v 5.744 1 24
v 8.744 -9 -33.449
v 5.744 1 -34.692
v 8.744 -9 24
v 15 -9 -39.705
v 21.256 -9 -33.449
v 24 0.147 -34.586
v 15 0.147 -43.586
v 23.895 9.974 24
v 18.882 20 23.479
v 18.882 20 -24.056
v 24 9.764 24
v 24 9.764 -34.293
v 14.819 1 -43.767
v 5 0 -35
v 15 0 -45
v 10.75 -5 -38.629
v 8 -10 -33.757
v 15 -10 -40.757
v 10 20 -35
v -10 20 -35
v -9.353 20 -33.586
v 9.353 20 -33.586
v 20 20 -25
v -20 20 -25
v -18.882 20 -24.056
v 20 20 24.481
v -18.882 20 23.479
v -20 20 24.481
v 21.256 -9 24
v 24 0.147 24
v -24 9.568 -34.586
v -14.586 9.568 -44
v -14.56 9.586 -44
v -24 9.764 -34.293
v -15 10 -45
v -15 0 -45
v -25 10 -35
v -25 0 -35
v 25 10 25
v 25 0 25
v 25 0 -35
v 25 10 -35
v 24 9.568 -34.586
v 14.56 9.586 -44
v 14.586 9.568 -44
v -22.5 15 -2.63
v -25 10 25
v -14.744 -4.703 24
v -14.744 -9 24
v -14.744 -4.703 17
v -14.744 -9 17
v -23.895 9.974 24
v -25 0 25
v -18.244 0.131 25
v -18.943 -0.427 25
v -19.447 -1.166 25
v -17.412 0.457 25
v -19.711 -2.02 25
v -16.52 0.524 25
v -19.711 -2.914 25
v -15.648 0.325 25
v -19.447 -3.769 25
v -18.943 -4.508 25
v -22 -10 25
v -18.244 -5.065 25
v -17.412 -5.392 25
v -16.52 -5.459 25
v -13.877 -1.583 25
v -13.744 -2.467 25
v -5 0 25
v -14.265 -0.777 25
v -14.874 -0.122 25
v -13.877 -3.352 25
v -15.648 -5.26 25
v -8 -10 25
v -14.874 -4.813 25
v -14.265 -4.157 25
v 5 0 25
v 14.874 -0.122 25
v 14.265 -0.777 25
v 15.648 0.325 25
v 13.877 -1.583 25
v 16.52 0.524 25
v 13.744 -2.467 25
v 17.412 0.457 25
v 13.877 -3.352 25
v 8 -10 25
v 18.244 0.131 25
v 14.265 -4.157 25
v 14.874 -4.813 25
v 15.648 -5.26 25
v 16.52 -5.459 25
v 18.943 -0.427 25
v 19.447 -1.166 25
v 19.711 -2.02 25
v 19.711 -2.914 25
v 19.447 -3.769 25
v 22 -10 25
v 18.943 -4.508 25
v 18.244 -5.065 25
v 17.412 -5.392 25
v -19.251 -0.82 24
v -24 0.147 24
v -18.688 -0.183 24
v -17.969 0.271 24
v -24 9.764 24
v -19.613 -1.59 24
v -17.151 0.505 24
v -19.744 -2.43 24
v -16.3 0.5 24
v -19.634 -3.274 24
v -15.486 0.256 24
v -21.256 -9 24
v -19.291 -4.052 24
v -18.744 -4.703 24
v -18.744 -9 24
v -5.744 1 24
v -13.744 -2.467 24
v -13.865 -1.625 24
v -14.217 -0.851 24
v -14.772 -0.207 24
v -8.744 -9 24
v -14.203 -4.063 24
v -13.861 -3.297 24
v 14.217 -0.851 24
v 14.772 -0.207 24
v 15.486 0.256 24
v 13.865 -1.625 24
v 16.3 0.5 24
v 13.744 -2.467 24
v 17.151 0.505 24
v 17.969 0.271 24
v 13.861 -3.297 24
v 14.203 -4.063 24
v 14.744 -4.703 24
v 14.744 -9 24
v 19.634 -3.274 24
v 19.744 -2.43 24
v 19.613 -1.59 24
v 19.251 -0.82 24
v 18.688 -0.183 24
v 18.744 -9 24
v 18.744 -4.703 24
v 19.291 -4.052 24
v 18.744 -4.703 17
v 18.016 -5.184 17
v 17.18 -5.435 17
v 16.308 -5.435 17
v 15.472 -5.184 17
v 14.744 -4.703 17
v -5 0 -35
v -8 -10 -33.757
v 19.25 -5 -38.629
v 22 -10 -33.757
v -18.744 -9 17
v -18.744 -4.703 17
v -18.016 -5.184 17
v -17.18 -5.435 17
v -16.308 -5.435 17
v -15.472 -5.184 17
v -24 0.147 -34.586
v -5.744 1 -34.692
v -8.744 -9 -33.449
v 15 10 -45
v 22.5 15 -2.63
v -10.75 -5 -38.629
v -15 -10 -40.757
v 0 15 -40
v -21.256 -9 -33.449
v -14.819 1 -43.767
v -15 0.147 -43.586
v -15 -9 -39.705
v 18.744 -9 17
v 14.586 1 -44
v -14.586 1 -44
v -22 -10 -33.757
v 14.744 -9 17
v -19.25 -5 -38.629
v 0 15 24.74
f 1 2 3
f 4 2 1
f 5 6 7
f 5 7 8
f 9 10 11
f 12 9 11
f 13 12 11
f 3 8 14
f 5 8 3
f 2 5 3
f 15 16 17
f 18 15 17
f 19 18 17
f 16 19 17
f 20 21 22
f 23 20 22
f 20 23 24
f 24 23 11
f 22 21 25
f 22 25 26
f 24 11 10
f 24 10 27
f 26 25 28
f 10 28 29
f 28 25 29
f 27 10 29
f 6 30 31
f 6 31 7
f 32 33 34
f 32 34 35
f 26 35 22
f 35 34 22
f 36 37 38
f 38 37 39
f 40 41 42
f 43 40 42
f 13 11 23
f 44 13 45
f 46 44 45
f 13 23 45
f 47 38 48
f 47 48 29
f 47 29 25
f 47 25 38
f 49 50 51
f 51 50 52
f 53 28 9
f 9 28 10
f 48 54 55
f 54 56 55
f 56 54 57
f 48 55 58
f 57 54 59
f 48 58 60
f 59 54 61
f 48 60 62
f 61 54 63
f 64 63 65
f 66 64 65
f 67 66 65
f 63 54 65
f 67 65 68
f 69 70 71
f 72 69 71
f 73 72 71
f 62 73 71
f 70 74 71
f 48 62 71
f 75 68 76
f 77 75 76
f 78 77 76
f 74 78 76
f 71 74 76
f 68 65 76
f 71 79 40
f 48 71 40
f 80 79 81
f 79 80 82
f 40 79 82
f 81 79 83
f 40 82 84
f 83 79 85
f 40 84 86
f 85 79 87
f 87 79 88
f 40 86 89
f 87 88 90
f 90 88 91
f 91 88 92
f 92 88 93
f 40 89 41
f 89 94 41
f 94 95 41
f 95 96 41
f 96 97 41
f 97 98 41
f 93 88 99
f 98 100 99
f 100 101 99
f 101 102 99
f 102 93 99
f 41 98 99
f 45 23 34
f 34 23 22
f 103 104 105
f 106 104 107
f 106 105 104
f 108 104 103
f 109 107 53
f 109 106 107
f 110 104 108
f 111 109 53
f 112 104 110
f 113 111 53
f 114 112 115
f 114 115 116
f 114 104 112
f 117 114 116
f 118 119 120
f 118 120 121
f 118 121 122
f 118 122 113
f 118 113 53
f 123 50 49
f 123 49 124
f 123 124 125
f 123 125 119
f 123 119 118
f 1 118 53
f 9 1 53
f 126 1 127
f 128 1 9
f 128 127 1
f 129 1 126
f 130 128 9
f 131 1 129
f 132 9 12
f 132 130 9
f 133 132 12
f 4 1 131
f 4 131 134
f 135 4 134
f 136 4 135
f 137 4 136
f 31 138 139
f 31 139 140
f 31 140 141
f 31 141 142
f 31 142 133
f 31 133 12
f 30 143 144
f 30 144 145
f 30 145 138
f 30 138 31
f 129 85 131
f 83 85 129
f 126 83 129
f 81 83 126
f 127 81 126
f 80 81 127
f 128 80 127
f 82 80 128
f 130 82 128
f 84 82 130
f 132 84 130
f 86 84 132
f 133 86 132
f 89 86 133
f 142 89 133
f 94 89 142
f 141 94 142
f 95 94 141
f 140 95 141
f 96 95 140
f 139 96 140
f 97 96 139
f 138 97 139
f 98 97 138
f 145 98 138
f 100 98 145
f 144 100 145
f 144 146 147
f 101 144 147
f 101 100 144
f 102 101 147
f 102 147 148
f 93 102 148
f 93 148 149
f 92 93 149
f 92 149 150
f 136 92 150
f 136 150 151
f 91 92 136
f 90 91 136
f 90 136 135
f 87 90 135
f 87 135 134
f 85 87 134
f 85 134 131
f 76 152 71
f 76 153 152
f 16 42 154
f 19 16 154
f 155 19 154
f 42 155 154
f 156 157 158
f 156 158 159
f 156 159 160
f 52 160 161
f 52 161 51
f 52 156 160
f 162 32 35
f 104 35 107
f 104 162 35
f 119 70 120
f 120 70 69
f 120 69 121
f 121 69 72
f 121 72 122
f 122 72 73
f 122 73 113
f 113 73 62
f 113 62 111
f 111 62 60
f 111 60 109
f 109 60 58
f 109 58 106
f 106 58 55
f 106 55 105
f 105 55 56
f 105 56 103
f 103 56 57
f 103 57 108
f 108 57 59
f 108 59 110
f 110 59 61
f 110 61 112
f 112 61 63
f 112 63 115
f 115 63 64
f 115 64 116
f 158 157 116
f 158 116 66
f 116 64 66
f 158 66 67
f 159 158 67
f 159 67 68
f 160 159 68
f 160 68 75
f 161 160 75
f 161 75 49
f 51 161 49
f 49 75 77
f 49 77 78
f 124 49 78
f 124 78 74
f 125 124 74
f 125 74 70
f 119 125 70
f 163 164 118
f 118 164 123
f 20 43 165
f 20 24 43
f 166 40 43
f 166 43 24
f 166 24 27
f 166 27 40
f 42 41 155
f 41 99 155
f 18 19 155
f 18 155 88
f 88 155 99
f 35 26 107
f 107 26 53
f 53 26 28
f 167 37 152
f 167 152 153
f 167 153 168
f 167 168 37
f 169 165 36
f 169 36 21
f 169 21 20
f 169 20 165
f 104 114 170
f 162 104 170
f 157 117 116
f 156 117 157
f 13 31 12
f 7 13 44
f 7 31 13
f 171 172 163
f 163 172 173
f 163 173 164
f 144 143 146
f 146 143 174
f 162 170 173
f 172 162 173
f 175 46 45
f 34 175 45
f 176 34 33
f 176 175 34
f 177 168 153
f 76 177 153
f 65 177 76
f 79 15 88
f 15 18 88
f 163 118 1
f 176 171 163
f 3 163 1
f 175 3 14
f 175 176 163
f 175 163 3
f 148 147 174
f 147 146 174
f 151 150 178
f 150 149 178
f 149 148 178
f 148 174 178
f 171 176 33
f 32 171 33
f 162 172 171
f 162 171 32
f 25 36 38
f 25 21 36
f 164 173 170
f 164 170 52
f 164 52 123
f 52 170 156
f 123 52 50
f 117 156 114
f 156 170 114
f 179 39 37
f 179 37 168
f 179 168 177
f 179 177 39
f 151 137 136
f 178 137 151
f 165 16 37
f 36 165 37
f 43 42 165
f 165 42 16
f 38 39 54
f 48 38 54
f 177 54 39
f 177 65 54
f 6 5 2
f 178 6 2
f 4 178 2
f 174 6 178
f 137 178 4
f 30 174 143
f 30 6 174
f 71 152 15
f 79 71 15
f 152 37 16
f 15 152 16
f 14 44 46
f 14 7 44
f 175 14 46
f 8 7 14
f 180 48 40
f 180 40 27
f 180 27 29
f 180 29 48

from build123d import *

# Parameters (mm, degrees)
EXTRUDE_1_DEPTH     = 10
SHELL_2_T           = -1
SKETCH_8_W          = 4
SKETCH_8_H          = 7
EXTRUDE_3_DEPTH     = 5
SKETCH_9_R          = 3
CUT_EXTRUDE_1_DEPTH = 10


with BuildPart() as part:
    # 草图3 → 凸台-拉伸1 (new body)
    with BuildSketch(Plane(origin=(0, 0, 0), x_dir=(1, 0, 0), z_dir=(0, 1, 0))):
        Polygon((-25, 35), (-25, -25), (25, -25), (25, 35), (15, 45), (-15, 45), align=None)
    extrude(amount=EXTRUDE_1_DEPTH)


with BuildPart() as body_2:
    # 草图5 → 放样1 section 0
    with BuildSketch(Plane(origin=(0, 0, 0), x_dir=(1, 0, 0), z_dir=(0, 1, 0))):
        with BuildLine():
            Line((25, 35), (15, 45))
            Line((15, 45), (5, 35))
            Line((5, 35), (5, -25))
            Line((5, -25), (25, -25))
            Line((25, -25), (25, 35))
        make_face()
    # 草图6 → 放样1 section 1
    with BuildSketch(Plane(origin=(0, -10, 0), x_dir=(1, 0, 0), z_dir=(0, 1, 0))):
        with BuildLine():
            Line((22, -25), (8, -25))
            Line((8, -25), (8, 33.757359313))
            Line((8, 33.757359313), (15, 40.757359313))
            Line((15, 40.757359313), (22, 33.757359313))
            Line((22, 33.757359313), (22, -25))
        make_face()
    loft()


with BuildPart() as body_3:
    # 镜向2: mirrored copy
    add(body_2.part.mirror(Plane(origin=(0, 0, 0), x_dir=(0, 0, 1), z_dir=(1, 0, 0))))


with BuildPart() as part_1:
    add(part.part)

    # 相交1: read off the stored shape, not the designer's step
    # 相交1: union body 3, body 2
    add(body_3.part)
    add(body_2.part)

    # 草图7 → section 1 of loft_2
    with BuildSketch(Plane(origin=(0, 20, 0), x_dir=(1, 0, 0), z_dir=(0, 1, 0)), mode=Mode.PRIVATE) as loft_2_s1:
        with BuildLine():
            Line((-20, -24.480567501), (20, -24.480567501))
            Line((20, -24.480567501), (20, 25))
            Line((20, 25), (10, 35))
            Line((10, 35), (-10, 35))
            Line((-10, 35), (-20, 25))
            Line((-20, 25), (-20, -24.480567501))
        make_face()
    # loft from a face of the part (loft_2)
    loft([part_1.faces().sort_by_distance((0, 10, -9.068627451))[0], loft_2_s1.sketch])

    # 抽壳2
    shell_2_openings = [part_1.faces().sort_by_distance(p)[0] for p in [
        (0, 20, -4.10112168),
    ]]
    offset(amount=SHELL_2_T, openings=shell_2_openings, kind=Kind.INTERSECTION)

    # 草图8 → 凸台-拉伸3 (add)
    with BuildSketch(Plane(origin=(0, -9, 0), x_dir=(1, 0, 0), z_dir=(0, 1, 0))):
        with Locations((-16.744030651, -20.5)):
            Rectangle(SKETCH_8_W, SKETCH_8_H)
    extrude_3 = extrude(amount=EXTRUDE_3_DEPTH)

    # 草图9 → 切除-拉伸1 (cut)
    with BuildSketch(Plane.XY.offset(25)):
        with Locations((-16.744030651, -2.467331557)):
            Circle(SKETCH_9_R)
    cut_extrude_1 = extrude(amount=-CUT_EXTRUDE_1_DEPTH, mode=Mode.SUBTRACT)

    # 镜向3: 凸台-拉伸3, 切除-拉伸1 across plane
    add(extrude_3.mirror(Plane(origin=(0, 0, 0), x_dir=(0, 0, 1), z_dir=(1, 0, 0))))
    add(cut_extrude_1.mirror(Plane(origin=(0, 0, 0), x_dir=(0, 0, 1), z_dir=(1, 0, 0))), mode=Mode.SUBTRACT)


solid = part_1.part
